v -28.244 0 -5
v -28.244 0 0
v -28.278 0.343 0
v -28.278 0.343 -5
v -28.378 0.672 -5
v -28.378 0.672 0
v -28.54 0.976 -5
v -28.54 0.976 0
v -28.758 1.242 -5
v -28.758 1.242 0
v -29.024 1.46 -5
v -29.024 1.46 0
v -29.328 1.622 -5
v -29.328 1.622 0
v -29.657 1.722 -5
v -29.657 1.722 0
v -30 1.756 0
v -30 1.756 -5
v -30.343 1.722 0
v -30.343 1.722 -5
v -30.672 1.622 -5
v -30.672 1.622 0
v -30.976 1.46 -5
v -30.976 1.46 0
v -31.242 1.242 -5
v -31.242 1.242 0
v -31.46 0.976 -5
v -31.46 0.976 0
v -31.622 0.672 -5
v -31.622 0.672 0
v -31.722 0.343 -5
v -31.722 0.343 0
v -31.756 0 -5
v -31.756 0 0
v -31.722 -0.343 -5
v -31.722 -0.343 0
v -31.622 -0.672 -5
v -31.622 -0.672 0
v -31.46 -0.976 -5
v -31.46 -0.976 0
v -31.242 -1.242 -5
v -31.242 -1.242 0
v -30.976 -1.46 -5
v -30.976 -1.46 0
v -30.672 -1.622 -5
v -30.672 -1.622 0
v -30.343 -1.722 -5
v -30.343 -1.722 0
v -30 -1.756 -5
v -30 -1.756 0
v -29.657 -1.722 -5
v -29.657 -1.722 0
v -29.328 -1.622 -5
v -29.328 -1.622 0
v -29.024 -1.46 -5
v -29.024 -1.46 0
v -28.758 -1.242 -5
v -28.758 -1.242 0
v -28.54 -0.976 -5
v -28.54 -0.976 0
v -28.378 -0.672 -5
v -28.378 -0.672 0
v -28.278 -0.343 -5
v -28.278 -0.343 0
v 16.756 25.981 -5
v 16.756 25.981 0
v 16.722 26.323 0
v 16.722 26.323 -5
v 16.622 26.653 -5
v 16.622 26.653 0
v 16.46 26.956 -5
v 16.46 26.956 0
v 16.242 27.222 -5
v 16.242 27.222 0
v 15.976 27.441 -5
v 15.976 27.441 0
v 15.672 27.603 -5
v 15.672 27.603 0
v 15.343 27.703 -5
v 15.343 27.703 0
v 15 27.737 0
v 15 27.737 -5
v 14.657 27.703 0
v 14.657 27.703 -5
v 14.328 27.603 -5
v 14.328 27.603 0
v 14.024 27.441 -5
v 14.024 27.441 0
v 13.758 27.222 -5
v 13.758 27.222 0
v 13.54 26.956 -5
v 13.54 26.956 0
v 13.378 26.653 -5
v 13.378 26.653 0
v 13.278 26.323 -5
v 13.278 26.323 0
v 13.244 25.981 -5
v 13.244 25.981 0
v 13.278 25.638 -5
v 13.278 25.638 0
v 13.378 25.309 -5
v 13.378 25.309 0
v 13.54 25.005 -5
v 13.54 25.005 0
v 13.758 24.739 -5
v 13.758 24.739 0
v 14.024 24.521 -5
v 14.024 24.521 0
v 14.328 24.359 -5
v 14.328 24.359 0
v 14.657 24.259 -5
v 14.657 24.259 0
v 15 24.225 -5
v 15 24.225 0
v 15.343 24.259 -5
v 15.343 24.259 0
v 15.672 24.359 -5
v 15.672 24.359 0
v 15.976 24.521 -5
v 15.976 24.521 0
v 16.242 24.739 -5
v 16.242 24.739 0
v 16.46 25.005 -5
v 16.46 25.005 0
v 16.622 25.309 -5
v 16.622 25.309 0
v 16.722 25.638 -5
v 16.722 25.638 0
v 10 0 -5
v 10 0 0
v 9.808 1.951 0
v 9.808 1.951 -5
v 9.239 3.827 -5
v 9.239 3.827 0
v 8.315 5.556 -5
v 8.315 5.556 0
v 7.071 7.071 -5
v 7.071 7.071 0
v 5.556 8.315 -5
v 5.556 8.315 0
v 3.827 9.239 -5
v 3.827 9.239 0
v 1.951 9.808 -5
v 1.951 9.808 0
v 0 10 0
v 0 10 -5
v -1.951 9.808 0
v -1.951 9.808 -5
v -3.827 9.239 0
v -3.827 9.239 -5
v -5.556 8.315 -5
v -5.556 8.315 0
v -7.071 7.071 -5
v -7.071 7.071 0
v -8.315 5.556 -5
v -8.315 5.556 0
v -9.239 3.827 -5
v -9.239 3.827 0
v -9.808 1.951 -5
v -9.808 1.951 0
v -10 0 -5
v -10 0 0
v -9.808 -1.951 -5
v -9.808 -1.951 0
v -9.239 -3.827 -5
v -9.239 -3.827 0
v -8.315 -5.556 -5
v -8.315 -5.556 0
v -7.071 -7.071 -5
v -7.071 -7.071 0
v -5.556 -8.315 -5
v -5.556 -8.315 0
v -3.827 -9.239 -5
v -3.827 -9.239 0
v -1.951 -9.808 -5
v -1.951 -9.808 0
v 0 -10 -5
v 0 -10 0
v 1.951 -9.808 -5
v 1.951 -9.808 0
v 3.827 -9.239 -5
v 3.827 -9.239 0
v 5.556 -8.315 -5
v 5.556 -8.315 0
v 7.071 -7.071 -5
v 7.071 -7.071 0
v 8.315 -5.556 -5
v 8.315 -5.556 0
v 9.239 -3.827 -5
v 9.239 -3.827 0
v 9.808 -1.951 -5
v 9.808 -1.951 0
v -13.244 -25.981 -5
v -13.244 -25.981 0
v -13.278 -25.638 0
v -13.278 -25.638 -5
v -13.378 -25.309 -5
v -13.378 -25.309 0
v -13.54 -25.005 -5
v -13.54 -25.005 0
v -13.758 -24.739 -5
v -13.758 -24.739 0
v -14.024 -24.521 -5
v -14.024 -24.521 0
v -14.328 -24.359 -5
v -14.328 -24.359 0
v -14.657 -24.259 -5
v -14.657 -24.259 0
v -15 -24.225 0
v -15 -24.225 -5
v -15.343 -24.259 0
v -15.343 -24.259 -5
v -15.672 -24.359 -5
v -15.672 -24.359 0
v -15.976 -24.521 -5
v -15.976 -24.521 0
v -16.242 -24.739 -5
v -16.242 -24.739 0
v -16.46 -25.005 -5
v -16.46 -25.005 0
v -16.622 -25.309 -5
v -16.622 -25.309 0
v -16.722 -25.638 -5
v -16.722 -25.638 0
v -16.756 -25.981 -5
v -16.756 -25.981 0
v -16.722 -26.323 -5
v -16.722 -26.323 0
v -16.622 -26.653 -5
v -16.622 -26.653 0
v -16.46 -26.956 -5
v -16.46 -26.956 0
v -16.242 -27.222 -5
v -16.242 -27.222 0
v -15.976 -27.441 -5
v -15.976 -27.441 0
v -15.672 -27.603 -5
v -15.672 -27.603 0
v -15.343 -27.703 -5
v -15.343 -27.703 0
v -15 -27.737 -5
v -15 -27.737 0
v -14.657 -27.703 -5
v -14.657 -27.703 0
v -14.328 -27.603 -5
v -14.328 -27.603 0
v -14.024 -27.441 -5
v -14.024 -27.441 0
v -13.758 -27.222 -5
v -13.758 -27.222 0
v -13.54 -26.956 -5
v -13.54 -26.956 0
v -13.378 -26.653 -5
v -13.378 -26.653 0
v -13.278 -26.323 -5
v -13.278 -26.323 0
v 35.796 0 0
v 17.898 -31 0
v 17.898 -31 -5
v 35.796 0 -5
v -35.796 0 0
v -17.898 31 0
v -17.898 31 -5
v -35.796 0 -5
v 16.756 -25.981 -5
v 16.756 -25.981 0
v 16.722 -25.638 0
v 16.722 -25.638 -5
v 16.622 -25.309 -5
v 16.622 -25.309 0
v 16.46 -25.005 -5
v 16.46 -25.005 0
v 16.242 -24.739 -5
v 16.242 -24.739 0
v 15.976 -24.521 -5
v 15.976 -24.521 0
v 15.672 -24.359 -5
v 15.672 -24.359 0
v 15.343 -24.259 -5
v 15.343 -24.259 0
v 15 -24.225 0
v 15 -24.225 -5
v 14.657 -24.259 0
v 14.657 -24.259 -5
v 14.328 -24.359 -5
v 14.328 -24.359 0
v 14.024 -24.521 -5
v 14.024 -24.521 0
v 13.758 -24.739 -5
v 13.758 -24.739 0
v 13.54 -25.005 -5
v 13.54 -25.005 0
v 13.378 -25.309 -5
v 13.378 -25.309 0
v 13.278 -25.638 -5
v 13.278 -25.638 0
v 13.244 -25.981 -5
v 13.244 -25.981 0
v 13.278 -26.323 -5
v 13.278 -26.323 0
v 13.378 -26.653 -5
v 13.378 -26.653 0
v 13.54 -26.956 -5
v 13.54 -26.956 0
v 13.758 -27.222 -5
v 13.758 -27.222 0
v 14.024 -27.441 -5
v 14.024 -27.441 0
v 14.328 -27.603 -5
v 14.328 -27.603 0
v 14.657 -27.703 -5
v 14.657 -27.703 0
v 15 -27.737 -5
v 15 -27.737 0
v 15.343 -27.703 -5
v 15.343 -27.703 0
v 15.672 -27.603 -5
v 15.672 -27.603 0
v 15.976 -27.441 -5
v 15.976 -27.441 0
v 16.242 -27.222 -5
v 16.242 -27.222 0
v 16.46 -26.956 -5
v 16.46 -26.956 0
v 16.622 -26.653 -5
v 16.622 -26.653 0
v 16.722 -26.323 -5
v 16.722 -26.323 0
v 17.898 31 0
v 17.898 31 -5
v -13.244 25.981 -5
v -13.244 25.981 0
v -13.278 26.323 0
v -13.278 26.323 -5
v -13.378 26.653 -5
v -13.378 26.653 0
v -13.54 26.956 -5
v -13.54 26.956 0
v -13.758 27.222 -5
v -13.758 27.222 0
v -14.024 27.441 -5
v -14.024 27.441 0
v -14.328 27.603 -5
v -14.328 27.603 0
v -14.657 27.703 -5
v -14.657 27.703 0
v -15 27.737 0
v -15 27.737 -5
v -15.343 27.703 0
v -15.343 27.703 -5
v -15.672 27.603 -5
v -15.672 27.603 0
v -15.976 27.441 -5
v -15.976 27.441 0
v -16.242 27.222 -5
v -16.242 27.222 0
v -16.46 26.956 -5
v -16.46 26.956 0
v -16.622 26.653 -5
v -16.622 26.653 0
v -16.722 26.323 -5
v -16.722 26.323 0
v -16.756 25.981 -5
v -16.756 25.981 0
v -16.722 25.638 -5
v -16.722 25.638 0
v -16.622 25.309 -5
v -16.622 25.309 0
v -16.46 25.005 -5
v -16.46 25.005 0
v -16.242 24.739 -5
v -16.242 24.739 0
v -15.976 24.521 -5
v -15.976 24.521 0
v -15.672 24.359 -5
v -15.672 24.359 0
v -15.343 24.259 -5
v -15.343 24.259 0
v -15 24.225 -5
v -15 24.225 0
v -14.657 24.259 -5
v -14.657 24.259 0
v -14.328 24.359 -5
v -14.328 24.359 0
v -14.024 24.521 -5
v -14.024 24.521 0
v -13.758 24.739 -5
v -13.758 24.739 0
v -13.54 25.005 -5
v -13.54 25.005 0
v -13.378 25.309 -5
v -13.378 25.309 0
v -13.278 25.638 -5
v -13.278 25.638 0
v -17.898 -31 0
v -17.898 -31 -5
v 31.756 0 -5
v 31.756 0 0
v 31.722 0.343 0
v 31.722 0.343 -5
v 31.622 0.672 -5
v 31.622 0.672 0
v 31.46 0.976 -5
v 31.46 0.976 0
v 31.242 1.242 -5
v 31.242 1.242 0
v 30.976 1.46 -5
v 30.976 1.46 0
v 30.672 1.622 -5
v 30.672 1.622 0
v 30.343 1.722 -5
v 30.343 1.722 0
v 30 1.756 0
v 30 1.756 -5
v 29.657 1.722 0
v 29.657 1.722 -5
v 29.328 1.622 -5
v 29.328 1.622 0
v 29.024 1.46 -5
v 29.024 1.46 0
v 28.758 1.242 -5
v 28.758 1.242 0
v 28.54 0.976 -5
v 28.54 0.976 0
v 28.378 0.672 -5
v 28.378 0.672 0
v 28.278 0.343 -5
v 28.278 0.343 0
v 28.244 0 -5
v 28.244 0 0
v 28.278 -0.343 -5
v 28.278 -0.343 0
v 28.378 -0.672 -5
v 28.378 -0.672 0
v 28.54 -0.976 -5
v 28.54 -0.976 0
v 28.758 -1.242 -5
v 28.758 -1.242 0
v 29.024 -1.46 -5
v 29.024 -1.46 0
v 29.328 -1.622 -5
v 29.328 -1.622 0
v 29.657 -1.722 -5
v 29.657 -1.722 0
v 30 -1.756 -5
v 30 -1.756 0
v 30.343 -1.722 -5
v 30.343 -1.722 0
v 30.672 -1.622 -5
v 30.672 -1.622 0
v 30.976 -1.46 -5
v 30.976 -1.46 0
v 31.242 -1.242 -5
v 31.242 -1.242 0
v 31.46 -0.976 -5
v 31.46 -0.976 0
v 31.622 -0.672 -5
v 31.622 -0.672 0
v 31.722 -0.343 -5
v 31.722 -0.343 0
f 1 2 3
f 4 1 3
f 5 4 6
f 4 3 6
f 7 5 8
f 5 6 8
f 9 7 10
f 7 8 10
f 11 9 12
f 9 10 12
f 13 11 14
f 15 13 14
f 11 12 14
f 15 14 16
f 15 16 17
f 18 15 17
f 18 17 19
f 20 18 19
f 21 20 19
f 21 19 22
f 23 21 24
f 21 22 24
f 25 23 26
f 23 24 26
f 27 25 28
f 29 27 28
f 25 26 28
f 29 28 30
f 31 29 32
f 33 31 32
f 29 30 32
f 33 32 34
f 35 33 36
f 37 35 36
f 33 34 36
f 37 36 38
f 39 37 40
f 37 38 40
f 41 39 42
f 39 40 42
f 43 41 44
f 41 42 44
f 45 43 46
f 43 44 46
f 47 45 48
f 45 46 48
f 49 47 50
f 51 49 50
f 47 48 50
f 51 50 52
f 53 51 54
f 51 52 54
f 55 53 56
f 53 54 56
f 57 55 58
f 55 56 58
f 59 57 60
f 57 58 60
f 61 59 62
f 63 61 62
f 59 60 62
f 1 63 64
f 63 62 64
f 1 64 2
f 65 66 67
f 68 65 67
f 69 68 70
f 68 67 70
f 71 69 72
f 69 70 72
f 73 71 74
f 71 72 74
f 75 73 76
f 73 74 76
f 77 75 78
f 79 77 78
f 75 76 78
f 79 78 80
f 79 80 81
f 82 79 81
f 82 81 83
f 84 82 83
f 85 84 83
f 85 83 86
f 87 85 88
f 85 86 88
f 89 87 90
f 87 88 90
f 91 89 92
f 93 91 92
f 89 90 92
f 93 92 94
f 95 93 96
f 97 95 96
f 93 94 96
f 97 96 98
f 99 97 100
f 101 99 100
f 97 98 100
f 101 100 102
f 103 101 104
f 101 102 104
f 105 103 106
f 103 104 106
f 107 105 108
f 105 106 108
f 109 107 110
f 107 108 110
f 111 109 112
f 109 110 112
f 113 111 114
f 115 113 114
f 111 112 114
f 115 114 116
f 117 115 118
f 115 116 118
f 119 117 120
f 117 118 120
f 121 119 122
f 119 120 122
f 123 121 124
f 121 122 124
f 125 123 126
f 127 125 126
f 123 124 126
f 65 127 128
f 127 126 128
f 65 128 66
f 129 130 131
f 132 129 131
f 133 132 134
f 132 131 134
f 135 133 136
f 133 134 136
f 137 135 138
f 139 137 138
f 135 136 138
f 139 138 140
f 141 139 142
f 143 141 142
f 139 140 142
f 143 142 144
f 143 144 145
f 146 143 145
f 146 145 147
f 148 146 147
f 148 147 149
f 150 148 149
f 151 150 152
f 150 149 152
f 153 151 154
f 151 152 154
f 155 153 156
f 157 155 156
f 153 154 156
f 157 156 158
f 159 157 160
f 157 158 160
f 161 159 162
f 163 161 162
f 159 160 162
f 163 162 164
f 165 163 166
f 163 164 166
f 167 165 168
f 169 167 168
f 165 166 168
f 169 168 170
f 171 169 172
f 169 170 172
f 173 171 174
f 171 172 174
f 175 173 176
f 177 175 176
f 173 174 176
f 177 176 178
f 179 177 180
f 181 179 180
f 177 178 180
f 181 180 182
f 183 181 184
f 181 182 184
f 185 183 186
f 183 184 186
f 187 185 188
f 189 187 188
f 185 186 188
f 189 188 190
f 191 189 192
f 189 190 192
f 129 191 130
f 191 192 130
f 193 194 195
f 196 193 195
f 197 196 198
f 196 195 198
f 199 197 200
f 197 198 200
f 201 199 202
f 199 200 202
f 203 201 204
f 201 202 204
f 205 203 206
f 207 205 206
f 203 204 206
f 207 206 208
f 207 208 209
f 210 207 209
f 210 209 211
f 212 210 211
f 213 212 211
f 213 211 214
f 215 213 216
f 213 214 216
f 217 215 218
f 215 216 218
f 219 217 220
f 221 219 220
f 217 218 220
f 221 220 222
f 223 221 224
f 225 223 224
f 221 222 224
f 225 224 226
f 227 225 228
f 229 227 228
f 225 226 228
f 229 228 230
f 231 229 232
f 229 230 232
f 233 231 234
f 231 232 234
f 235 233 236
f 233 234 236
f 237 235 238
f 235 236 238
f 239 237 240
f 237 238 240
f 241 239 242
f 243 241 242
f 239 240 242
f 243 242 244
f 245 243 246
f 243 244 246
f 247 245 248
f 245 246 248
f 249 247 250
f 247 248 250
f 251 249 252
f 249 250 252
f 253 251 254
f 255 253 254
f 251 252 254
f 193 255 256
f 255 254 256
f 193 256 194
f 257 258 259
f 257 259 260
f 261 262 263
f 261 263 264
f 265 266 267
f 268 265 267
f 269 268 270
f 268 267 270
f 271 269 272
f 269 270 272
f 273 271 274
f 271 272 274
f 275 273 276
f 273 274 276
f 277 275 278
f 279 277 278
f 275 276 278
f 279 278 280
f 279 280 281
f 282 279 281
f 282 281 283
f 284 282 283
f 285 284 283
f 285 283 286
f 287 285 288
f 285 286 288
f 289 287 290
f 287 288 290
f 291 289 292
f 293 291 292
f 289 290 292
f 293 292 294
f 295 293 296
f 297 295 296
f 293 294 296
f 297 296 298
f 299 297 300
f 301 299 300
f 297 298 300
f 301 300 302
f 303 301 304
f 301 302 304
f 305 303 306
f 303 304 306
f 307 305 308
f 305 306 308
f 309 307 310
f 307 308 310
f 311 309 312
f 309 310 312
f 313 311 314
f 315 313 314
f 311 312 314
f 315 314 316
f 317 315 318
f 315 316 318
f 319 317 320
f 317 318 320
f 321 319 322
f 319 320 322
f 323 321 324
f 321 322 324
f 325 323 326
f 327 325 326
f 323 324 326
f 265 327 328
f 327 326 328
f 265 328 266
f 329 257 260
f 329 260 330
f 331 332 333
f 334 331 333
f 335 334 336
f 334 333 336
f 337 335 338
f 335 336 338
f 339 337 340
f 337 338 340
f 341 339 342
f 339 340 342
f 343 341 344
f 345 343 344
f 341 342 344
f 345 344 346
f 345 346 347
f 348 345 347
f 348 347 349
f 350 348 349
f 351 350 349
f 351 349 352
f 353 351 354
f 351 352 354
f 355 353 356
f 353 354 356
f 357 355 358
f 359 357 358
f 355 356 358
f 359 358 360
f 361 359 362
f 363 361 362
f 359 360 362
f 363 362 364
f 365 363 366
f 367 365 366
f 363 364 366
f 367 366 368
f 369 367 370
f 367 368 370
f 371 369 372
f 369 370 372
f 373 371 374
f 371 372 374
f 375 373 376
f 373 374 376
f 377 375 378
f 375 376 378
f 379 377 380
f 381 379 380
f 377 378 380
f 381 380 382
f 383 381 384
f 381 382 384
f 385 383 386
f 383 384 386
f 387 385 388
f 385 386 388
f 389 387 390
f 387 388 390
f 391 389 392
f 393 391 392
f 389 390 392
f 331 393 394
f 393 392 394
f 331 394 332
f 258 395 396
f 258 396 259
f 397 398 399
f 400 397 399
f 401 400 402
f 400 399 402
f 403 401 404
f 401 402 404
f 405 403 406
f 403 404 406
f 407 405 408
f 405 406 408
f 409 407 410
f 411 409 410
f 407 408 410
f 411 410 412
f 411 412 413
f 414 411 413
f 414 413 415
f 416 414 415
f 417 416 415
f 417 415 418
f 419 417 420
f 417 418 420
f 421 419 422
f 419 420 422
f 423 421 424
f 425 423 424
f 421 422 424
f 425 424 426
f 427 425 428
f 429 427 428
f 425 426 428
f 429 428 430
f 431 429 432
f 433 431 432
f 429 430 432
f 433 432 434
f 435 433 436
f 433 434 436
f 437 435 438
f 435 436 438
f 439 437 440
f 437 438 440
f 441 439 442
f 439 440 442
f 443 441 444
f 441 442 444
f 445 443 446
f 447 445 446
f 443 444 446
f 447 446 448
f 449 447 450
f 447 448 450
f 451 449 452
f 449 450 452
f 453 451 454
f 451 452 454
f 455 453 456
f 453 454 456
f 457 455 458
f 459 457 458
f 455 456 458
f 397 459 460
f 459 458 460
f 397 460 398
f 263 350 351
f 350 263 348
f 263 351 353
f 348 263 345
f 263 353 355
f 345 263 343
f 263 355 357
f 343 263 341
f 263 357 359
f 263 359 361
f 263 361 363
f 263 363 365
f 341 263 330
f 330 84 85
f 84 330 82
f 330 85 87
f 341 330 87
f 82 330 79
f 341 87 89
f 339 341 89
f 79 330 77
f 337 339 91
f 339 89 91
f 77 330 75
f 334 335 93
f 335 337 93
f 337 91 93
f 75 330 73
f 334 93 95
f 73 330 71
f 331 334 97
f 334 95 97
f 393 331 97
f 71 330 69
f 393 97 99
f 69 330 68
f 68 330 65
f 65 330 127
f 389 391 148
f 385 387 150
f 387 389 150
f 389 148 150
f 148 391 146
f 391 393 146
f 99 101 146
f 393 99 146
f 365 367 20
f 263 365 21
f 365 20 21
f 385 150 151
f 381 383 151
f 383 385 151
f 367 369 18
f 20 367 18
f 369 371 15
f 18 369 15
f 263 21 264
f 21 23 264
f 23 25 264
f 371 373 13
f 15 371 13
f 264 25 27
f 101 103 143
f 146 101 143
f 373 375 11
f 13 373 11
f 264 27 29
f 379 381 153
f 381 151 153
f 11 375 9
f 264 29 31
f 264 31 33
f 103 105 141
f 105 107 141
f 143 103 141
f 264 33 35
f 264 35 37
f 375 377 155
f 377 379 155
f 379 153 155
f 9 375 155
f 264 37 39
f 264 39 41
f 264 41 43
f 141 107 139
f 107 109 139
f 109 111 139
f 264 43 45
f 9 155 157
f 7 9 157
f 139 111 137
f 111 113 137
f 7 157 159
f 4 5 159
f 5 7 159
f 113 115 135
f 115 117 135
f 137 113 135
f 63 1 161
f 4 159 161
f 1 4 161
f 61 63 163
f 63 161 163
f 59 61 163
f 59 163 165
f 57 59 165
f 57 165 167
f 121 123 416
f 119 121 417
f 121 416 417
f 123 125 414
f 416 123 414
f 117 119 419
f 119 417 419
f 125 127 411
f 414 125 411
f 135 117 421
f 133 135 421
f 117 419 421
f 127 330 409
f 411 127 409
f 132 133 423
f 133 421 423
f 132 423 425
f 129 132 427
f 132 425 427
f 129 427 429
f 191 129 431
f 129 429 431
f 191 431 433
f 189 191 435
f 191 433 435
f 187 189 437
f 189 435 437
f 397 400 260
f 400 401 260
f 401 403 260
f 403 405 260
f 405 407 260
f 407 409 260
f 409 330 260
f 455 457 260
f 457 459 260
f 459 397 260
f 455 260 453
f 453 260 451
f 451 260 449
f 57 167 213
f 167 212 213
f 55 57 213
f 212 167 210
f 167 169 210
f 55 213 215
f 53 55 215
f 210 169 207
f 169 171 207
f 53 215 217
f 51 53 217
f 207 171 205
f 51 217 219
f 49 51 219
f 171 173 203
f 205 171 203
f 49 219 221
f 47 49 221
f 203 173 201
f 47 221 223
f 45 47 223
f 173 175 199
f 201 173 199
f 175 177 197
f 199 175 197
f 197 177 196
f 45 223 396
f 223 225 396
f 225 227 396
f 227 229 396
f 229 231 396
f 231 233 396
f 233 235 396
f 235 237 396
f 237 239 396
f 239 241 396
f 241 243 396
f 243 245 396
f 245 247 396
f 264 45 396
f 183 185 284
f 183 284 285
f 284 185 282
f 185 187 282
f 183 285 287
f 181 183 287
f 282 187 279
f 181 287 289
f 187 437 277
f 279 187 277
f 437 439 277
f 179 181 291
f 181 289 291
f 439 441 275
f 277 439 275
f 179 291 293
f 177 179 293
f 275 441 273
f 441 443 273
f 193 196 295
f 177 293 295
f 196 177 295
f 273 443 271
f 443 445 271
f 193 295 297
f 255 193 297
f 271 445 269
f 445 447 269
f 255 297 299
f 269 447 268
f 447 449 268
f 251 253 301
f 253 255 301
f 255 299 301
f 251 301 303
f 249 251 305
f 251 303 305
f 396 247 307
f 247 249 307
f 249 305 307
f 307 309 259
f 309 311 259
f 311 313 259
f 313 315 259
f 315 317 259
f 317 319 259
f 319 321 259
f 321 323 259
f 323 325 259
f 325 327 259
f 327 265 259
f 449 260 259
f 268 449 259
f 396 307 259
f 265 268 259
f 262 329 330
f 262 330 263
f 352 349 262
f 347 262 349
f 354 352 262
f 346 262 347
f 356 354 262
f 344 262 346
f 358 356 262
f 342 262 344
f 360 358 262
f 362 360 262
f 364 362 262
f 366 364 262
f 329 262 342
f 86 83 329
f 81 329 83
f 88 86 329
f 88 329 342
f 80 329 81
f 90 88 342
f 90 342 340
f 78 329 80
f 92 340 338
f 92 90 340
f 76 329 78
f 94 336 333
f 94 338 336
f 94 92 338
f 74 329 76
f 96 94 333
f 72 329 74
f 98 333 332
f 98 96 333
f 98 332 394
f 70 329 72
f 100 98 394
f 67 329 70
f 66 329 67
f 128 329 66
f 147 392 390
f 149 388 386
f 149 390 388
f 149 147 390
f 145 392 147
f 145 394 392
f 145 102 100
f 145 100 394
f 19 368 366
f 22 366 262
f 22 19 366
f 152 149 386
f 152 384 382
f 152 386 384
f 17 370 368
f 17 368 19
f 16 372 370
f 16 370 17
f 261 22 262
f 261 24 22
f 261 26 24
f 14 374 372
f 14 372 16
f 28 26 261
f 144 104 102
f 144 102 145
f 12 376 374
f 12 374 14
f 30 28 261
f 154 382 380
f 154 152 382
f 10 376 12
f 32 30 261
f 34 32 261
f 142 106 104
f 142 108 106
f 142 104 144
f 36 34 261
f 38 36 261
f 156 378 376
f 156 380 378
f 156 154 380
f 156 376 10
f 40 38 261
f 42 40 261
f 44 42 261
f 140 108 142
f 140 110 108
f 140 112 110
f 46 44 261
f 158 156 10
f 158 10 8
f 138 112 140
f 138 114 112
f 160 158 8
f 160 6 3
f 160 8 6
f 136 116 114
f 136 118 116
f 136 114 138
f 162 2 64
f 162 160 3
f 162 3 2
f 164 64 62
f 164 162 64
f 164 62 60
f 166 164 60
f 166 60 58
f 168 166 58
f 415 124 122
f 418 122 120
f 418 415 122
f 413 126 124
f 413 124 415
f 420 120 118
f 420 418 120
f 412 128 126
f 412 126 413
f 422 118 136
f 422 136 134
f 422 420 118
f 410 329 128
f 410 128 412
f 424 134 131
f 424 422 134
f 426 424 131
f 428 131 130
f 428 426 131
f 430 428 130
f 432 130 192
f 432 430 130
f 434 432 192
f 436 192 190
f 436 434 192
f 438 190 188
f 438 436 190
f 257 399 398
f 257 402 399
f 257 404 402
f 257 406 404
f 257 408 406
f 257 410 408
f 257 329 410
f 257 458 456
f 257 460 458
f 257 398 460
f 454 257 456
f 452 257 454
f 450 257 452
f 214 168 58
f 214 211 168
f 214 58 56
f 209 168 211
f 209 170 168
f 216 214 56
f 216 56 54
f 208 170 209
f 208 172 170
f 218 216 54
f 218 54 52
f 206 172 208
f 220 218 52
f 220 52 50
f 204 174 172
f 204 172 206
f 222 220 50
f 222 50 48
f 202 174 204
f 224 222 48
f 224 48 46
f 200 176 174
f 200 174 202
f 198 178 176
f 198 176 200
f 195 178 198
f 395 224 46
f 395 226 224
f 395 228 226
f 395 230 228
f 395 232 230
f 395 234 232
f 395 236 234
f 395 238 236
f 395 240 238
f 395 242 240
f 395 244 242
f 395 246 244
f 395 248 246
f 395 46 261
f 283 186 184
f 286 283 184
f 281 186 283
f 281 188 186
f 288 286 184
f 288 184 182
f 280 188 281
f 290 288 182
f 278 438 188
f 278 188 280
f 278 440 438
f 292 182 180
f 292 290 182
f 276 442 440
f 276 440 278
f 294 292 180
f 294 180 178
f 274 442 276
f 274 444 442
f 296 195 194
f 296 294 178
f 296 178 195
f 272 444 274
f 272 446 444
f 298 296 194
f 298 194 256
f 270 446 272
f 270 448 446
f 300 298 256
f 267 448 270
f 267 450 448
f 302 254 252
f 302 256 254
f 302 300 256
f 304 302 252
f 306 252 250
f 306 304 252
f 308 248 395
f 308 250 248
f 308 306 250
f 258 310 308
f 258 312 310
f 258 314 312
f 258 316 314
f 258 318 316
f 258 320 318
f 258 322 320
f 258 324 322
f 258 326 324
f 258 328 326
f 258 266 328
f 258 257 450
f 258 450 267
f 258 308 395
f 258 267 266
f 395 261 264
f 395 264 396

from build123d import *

# Parameters (mm, degrees)
F1_DEPTH = 5
F2_COUNT = 3
F3_R     = 10
F4_DEPTH = 5
F5_R     = 1.755872499
F6_DEPTH = 5


with BuildPart() as f1:
    # F0 (on Top) → F1 (new body)
    with BuildSketch(Plane.XY):
        Polygon((35.7957166898, 0), (17.8978583449, 31), (0, 0), (17.8978583449, -31), align=None)
    extrude(amount=-F1_DEPTH)

    # F2: F1 ×3 about axis
    f2_axis = Axis((0, 0, -2.5), (0, 0, 1))


with BuildPart() as f1_1:
    add(f1.part)
    for i in range(1, F2_COUNT):
        add(f1.part.rotate(f2_axis, i * 360 / F2_COUNT))

    # F3 (on face) → F4 (cut, through all)
    with BuildSketch(Plane.XY):
        Circle(F3_R)
    extrude(amount=-F4_DEPTH, mode=Mode.SUBTRACT)

    # F5 (on face) → F6 (cut, through all)
    with BuildSketch(Plane.XY):
        with Locations((15, -25.9807621135)):
            Circle(F5_R)
        with Locations((-15, -25.9807621135)):
            Circle(F5_R)
        with Locations((30, 0)):
            Circle(F5_R)
        with Locations((15, 25.9807621135)):
            Circle(F5_R)
        with Locations((-15, 25.9807621135)):
            Circle(F5_R)
        with Locations((-30, 0)):
            Circle(F5_R)
    extrude(amount=-F6_DEPTH, mode=Mode.SUBTRACT)


solid = f1_1.part
